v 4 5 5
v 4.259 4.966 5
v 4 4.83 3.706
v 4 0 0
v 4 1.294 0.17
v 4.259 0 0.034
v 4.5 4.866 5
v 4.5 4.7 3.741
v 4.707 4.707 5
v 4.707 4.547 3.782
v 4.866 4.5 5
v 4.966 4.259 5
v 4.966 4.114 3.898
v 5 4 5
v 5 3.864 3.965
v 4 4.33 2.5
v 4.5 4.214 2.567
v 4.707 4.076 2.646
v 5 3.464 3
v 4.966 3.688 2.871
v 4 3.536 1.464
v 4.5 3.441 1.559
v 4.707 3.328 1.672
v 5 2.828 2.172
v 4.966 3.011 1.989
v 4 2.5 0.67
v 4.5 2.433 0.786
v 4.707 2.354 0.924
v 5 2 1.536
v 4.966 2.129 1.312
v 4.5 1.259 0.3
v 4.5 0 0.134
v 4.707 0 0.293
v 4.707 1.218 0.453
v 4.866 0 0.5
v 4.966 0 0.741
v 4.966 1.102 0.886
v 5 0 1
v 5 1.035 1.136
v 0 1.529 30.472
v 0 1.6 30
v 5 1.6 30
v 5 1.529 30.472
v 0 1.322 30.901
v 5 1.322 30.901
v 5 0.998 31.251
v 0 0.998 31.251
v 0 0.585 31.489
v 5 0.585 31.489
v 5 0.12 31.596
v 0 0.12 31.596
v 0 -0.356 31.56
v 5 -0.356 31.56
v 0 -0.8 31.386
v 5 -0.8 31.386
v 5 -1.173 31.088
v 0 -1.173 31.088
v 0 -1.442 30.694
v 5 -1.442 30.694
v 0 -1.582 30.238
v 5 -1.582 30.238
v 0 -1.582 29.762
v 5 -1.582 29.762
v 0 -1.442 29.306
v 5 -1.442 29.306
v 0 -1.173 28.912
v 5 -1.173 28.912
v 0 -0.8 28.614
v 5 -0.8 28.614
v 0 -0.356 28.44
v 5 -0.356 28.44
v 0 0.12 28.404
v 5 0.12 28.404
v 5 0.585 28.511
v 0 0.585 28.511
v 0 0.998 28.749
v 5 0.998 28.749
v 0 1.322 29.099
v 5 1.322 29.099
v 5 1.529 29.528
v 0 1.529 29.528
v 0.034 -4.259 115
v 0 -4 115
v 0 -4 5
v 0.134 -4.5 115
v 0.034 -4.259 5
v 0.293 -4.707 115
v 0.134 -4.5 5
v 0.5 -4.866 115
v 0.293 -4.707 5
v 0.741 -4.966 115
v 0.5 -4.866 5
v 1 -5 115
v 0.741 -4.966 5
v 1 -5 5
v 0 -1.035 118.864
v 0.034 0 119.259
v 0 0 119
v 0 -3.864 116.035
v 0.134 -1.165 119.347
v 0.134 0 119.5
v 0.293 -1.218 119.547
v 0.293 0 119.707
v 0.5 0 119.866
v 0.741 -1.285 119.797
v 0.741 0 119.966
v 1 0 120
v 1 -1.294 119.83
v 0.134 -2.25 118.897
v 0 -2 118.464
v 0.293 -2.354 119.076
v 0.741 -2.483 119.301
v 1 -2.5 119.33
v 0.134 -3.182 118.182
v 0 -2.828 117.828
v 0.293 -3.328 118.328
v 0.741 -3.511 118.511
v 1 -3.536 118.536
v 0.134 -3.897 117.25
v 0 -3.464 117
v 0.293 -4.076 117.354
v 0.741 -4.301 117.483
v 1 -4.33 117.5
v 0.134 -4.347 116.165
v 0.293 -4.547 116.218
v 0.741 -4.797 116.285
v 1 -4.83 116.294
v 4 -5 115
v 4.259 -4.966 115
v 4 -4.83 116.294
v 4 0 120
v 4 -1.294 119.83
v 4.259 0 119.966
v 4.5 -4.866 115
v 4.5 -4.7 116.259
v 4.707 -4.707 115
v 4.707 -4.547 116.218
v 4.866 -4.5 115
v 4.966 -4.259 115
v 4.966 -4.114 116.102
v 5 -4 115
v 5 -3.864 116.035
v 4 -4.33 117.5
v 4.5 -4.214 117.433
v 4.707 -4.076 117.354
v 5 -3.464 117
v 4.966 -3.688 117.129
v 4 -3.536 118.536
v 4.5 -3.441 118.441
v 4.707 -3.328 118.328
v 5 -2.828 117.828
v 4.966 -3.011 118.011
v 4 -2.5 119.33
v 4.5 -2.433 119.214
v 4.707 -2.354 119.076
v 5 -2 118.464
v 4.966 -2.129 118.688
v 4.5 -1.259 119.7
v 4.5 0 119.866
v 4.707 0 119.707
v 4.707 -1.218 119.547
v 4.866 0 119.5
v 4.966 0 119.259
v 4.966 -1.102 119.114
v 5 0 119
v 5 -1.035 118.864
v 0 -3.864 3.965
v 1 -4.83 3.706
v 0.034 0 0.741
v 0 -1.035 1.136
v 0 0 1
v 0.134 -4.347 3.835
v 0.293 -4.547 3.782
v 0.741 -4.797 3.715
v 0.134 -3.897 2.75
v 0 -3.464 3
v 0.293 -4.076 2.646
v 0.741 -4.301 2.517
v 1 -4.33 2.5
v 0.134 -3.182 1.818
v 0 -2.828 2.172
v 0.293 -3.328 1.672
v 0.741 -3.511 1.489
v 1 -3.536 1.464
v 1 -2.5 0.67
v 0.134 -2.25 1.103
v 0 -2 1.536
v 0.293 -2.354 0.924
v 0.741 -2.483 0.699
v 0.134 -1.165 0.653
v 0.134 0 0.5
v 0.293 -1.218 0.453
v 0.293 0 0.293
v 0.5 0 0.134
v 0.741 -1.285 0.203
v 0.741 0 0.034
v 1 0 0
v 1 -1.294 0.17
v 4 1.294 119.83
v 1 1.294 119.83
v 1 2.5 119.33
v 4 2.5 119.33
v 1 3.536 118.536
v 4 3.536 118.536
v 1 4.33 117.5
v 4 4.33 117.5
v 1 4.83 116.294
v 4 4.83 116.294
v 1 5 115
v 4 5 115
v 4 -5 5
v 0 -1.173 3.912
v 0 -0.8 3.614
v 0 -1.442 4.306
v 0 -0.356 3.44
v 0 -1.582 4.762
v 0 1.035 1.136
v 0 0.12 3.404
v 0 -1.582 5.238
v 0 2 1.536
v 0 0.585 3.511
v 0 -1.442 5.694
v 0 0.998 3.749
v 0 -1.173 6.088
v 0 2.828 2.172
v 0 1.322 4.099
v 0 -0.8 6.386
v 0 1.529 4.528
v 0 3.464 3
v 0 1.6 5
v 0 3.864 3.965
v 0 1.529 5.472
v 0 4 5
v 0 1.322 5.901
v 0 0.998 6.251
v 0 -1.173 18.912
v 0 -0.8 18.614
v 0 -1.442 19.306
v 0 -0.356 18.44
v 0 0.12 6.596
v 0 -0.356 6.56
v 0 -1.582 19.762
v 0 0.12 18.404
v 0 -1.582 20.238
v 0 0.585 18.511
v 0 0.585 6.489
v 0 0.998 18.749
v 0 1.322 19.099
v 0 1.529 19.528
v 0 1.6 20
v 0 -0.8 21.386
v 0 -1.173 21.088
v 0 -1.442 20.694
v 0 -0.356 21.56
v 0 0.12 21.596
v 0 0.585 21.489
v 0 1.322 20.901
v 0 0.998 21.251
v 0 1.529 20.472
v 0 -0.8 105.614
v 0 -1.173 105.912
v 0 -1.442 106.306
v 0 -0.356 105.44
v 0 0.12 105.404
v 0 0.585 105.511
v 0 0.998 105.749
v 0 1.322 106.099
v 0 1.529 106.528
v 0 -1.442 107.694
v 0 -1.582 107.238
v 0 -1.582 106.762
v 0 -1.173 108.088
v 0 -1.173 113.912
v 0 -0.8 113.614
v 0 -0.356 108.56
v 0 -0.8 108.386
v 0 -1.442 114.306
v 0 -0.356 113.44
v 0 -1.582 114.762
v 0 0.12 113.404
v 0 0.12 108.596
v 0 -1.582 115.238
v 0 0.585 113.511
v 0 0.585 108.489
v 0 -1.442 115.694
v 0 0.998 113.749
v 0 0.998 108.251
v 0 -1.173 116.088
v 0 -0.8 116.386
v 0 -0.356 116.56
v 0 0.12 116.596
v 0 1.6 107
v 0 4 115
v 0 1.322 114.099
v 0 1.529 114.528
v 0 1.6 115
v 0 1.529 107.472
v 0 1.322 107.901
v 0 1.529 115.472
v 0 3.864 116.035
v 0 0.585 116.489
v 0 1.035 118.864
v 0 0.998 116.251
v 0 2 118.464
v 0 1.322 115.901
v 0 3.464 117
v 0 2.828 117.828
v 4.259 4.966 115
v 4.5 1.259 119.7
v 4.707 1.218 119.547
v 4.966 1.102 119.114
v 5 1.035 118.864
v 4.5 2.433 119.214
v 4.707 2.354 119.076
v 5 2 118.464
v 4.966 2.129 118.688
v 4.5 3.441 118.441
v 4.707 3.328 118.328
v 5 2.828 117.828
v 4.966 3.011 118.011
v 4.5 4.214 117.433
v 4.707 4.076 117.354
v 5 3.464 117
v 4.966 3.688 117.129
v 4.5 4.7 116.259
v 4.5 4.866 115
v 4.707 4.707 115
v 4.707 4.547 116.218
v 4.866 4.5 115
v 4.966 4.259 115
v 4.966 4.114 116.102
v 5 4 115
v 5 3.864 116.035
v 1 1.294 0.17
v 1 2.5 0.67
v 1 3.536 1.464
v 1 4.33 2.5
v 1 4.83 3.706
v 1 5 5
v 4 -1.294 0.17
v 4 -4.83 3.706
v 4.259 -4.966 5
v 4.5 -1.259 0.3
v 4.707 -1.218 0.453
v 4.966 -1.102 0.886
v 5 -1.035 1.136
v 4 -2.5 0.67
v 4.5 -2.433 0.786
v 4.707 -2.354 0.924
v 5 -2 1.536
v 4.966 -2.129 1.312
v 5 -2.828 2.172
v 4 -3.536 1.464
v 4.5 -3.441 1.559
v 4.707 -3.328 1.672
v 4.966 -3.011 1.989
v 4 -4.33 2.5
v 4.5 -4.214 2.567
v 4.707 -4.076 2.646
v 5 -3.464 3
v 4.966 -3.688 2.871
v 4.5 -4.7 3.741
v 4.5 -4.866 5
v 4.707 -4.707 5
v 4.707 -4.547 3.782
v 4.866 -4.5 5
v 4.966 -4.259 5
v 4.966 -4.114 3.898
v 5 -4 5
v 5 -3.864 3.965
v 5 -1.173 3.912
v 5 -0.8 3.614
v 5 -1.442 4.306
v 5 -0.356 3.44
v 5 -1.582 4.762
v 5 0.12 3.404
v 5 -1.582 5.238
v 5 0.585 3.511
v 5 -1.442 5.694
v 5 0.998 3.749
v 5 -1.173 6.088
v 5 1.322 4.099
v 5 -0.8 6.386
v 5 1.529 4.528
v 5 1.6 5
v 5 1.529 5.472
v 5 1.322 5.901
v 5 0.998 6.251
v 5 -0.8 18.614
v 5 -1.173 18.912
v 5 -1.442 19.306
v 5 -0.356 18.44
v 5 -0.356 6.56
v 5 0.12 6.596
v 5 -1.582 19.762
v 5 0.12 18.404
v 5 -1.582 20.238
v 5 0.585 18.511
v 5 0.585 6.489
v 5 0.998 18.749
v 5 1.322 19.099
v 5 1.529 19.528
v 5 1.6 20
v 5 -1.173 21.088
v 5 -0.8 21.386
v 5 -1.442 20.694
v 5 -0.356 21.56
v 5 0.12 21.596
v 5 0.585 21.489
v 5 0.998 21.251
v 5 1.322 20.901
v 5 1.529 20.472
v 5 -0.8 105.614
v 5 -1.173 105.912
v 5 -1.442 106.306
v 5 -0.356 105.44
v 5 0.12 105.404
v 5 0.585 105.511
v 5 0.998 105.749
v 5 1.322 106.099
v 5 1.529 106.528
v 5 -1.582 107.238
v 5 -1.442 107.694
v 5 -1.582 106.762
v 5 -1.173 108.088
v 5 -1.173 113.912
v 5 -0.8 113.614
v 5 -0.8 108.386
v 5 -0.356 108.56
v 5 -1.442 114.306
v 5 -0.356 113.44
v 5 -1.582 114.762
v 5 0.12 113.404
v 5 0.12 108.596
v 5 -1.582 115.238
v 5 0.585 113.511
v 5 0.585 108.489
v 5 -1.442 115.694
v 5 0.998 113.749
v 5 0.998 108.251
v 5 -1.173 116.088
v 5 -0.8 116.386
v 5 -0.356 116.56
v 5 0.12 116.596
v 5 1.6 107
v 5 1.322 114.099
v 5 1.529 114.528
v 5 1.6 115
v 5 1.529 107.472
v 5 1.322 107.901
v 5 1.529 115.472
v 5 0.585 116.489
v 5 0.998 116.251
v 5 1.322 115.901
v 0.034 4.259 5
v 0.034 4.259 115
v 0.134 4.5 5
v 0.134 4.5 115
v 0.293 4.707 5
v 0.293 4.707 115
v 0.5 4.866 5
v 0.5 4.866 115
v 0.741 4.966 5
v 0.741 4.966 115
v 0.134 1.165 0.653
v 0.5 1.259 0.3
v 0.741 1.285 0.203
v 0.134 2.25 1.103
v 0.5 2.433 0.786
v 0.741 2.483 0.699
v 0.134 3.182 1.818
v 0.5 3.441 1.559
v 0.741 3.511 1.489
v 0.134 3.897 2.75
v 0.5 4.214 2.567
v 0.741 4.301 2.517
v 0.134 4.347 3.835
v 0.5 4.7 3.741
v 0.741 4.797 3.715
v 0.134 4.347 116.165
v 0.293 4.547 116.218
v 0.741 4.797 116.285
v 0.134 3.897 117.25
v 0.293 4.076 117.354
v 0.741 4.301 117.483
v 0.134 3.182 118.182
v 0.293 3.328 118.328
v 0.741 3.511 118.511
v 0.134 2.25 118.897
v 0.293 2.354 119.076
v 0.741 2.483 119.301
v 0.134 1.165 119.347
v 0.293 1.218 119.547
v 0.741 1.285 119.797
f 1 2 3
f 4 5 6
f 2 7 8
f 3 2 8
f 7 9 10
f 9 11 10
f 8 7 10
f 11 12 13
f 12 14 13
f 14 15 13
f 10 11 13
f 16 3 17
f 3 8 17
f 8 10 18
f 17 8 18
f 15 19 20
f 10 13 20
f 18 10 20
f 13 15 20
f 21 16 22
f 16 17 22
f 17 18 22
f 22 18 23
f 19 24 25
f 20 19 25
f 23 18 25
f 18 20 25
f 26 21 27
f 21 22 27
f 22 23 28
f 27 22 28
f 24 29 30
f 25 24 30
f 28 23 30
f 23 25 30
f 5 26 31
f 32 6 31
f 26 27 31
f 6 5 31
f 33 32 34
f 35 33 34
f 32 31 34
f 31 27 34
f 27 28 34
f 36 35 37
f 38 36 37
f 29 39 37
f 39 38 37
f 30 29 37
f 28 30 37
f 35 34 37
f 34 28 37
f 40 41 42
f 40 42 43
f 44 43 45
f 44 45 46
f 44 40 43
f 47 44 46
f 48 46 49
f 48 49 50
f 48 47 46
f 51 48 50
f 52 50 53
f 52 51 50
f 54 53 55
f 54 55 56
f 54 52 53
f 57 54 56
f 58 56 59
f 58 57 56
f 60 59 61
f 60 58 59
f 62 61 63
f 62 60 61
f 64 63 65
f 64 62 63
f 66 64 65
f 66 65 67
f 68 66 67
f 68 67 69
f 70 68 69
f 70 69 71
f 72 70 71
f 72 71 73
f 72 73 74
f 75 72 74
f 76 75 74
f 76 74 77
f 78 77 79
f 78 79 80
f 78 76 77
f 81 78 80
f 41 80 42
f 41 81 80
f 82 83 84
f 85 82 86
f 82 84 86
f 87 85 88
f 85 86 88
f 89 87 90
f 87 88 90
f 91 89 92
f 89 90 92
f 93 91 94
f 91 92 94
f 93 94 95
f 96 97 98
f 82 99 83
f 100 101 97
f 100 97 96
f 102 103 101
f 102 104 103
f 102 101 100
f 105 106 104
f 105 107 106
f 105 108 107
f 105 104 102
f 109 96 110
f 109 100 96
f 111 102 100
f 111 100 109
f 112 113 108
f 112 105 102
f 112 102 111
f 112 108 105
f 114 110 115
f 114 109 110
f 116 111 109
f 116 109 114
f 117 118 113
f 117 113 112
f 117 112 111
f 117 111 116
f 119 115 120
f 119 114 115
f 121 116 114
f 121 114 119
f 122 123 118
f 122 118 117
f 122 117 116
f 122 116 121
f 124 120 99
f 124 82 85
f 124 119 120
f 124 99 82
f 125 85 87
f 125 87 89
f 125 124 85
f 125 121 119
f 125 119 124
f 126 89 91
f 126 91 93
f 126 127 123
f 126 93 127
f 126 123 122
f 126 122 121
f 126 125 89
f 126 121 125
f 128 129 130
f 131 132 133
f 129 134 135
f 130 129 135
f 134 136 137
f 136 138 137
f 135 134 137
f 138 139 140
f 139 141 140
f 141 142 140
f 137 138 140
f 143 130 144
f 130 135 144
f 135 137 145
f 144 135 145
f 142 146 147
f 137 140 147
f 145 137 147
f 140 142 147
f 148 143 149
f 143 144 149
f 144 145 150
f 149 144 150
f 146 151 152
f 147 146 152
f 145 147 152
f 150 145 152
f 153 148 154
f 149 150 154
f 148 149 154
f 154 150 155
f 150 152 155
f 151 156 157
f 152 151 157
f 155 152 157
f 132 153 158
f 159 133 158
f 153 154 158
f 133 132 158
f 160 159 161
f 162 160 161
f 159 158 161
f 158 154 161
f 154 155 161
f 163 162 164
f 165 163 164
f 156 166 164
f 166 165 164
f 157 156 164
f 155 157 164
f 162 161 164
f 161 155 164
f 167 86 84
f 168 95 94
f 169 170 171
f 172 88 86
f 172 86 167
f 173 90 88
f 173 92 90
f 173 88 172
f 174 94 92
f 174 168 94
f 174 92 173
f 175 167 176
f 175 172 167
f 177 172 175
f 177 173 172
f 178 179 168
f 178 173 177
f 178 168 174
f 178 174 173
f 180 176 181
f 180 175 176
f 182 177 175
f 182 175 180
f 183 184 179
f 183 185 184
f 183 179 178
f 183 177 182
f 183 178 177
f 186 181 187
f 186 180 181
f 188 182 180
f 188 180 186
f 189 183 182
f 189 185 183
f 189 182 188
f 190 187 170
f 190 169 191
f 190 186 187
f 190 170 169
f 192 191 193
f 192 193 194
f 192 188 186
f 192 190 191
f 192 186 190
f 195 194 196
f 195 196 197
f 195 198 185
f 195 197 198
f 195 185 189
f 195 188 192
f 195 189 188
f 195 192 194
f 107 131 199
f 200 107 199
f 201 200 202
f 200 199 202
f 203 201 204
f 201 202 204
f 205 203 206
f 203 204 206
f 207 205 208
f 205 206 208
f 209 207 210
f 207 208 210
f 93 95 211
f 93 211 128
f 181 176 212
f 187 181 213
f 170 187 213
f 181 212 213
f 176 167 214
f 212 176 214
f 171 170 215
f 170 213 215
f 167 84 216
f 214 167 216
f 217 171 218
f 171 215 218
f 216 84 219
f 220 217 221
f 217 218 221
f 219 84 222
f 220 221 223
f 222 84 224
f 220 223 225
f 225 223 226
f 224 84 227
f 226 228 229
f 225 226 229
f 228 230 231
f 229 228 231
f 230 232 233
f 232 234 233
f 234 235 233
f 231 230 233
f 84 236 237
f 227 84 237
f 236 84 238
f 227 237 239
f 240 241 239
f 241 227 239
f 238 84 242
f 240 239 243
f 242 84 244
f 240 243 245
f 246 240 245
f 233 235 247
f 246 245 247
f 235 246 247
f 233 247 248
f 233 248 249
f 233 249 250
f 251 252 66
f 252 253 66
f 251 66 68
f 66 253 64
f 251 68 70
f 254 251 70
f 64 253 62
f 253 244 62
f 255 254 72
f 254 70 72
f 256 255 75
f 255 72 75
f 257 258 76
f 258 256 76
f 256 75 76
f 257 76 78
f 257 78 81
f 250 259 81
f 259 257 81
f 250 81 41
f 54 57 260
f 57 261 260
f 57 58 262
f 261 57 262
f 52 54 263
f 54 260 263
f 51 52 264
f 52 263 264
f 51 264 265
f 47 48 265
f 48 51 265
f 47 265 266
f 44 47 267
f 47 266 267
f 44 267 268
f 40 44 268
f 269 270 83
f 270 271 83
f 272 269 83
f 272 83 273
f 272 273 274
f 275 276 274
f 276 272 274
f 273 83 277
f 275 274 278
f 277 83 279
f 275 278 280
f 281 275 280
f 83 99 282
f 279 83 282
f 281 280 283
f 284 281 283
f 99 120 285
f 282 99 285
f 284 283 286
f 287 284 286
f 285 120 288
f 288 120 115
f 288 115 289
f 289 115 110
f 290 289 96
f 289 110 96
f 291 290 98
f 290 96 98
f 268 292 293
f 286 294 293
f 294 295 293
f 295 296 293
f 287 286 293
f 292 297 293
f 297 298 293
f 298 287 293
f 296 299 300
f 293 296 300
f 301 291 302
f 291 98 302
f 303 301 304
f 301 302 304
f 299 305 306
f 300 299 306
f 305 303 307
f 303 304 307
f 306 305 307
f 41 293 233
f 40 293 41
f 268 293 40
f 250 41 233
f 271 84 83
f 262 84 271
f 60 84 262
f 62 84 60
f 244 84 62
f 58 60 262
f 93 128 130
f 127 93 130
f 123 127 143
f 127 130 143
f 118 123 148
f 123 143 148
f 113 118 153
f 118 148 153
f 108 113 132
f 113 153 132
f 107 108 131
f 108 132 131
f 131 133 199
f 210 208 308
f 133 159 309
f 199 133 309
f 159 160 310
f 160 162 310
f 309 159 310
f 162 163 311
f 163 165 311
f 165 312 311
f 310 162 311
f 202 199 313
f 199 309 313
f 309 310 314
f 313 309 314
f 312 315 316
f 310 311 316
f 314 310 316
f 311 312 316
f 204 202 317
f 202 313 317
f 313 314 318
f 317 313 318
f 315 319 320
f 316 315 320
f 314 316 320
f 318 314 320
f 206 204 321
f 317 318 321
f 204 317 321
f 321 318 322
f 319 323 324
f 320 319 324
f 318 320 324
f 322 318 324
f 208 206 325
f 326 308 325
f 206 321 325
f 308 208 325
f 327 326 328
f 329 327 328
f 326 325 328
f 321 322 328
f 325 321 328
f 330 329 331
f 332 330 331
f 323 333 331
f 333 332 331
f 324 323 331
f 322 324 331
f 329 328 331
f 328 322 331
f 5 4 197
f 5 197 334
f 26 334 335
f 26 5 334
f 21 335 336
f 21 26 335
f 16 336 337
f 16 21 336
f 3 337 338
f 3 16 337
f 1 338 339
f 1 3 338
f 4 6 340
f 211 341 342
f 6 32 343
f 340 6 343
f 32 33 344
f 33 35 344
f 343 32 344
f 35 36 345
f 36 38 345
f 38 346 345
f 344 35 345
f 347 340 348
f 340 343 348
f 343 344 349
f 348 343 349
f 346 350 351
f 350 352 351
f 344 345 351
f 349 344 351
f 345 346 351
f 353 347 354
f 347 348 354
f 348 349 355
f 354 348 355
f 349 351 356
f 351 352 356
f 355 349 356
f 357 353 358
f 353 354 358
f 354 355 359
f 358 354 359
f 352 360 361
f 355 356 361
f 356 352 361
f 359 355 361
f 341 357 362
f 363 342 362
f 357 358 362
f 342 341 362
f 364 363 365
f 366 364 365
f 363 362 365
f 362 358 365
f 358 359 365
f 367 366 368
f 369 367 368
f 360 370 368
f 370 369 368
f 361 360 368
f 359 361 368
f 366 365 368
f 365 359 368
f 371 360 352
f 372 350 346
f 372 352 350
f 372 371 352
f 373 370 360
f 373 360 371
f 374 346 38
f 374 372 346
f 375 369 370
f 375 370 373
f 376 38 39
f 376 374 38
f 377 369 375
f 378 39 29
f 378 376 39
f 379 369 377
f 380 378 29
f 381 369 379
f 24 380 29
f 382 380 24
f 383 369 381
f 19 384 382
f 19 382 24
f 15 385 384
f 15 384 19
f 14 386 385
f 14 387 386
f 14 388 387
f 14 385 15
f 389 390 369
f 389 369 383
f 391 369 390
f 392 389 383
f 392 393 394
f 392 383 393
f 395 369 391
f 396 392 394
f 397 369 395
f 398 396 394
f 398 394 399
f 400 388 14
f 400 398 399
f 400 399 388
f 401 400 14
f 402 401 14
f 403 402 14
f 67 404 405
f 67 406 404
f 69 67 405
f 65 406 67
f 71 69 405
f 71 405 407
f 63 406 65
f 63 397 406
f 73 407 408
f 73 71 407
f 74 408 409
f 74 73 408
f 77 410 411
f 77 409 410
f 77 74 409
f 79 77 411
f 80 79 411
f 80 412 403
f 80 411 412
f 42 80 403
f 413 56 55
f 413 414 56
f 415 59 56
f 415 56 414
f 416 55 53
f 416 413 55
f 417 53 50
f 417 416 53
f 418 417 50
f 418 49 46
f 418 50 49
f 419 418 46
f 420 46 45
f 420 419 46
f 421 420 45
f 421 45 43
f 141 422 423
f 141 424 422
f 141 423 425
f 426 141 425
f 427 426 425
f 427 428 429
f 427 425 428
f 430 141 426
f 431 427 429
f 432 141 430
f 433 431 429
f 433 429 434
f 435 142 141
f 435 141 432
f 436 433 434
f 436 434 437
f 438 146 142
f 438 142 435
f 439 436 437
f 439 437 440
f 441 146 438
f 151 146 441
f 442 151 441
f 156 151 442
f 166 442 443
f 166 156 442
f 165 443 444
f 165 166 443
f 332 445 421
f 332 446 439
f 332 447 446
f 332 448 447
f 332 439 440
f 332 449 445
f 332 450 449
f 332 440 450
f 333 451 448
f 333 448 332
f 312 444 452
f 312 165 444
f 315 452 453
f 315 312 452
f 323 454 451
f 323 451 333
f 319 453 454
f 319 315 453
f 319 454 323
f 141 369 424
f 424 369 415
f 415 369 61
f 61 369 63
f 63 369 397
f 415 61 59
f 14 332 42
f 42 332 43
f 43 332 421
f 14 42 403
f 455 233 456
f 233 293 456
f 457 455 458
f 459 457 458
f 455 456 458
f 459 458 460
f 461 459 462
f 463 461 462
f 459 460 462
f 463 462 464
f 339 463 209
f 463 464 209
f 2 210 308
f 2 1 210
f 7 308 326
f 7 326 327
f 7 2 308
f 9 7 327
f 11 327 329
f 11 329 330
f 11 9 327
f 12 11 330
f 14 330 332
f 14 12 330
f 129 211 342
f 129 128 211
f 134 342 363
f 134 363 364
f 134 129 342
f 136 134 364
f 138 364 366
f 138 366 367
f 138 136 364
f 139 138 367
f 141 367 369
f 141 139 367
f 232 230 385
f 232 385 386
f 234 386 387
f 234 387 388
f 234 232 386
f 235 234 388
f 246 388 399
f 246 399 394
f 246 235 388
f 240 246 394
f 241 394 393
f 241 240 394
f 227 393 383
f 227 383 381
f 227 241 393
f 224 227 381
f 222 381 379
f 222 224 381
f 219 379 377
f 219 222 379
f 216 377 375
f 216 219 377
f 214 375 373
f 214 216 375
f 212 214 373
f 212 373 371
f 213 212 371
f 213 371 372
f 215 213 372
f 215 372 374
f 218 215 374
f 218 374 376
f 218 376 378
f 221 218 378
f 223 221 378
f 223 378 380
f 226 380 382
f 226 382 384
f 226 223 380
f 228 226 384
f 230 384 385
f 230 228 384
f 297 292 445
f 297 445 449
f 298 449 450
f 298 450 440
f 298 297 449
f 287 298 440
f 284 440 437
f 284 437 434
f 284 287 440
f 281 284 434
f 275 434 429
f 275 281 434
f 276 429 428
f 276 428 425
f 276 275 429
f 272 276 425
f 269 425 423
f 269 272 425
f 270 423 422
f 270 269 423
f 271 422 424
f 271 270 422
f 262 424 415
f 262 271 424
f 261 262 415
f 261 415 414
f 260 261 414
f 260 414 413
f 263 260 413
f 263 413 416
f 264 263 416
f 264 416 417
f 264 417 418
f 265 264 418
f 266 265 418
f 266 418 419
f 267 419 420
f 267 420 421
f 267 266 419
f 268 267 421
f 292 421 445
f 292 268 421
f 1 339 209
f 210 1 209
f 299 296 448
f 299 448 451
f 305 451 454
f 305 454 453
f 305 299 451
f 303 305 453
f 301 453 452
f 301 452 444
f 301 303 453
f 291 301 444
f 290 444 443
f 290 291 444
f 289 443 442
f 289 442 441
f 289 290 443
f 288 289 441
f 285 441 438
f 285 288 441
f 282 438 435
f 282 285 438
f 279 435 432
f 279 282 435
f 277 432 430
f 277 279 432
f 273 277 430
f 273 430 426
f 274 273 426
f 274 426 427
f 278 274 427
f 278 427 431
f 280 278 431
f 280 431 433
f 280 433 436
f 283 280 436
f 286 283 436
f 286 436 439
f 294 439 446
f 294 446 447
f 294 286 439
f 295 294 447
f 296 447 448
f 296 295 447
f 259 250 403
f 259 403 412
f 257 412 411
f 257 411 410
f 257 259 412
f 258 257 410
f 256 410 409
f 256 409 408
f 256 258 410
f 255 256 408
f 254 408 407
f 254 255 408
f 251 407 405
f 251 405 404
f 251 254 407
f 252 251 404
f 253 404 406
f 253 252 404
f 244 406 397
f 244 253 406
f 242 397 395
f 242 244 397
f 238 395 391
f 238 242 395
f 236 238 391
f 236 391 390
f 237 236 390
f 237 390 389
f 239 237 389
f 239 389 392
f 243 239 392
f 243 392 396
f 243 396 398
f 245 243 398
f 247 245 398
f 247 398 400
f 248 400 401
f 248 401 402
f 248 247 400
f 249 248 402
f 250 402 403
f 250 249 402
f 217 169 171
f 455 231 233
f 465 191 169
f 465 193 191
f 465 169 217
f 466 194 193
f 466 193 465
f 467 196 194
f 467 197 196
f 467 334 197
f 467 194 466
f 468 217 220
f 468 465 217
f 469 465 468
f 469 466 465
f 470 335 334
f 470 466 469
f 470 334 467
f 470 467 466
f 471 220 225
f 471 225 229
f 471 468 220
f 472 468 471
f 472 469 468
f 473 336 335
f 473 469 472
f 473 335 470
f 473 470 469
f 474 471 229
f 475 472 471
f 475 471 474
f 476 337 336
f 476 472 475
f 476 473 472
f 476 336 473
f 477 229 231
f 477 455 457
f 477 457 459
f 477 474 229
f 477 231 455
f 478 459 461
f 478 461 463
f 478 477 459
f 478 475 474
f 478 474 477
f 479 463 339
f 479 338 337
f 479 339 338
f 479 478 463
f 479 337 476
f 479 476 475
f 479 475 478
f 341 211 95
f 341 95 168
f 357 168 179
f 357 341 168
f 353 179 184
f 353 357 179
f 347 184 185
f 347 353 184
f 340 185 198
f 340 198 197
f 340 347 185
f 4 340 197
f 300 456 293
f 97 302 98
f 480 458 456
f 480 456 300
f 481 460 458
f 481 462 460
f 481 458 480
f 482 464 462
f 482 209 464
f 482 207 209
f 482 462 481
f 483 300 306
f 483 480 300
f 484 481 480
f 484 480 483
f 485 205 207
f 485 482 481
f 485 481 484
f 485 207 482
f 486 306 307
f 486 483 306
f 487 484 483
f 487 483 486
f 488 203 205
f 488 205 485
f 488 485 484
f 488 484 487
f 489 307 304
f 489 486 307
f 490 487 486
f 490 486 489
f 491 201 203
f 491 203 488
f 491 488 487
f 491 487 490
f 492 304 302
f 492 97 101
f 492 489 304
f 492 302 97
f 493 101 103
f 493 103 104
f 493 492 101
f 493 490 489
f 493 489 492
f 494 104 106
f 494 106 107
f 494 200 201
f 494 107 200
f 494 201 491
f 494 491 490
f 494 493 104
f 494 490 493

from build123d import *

# Parameters (mm, degrees)
F0_W     = 10
F0_H     = 120
F0_R     = 1.6
F1_DEPTH = 5
F2_R     = 4.99999
F3_R     = 1


# Not quite as in the source:
# - a fillet or chamfer is up to 0.001 mm smaller than in the source, because OpenCascade refuses the exact size


with BuildPart() as f1:
    # F0 (on Right) → F1 (new body)
    with BuildSketch(Plane.YZ):
        with Locations((0, 60)):
            Rectangle(F0_W, F0_H)
        with Locations((0, 5)):
            Circle(F0_R, mode=Mode.SUBTRACT)
        with Locations((0, 20)):
            Circle(F0_R, mode=Mode.SUBTRACT)
        with Locations((0, 30)):
            Circle(F0_R, mode=Mode.SUBTRACT)
        with Locations((0, 107)):
            Circle(F0_R, mode=Mode.SUBTRACT)
        with Locations((0, 115)):
            Circle(F0_R, mode=Mode.SUBTRACT)
    extrude(amount=F1_DEPTH)

    # F2 (radius 5 in the source; OpenCascade refuses exactly that, so slightly less here)
    f2_edges = [f1.edges().sort_by_distance(p)[0] for p in [
        (2.5, 5, 0),
        (2.5, -5, 0),
        (2.5, 5, 120),
        (2.5, -5, 120),
    ]]
    fillet(f2_edges, radius=F2_R)

    # F3
    f3_edges = [f1.edges().sort_by_distance(p)[0] for p in [
        (5, -3.535537, 118.535537),
        (0, 5, 60),
    ]]
    fillet(f3_edges, radius=F3_R)


solid = f1.part
